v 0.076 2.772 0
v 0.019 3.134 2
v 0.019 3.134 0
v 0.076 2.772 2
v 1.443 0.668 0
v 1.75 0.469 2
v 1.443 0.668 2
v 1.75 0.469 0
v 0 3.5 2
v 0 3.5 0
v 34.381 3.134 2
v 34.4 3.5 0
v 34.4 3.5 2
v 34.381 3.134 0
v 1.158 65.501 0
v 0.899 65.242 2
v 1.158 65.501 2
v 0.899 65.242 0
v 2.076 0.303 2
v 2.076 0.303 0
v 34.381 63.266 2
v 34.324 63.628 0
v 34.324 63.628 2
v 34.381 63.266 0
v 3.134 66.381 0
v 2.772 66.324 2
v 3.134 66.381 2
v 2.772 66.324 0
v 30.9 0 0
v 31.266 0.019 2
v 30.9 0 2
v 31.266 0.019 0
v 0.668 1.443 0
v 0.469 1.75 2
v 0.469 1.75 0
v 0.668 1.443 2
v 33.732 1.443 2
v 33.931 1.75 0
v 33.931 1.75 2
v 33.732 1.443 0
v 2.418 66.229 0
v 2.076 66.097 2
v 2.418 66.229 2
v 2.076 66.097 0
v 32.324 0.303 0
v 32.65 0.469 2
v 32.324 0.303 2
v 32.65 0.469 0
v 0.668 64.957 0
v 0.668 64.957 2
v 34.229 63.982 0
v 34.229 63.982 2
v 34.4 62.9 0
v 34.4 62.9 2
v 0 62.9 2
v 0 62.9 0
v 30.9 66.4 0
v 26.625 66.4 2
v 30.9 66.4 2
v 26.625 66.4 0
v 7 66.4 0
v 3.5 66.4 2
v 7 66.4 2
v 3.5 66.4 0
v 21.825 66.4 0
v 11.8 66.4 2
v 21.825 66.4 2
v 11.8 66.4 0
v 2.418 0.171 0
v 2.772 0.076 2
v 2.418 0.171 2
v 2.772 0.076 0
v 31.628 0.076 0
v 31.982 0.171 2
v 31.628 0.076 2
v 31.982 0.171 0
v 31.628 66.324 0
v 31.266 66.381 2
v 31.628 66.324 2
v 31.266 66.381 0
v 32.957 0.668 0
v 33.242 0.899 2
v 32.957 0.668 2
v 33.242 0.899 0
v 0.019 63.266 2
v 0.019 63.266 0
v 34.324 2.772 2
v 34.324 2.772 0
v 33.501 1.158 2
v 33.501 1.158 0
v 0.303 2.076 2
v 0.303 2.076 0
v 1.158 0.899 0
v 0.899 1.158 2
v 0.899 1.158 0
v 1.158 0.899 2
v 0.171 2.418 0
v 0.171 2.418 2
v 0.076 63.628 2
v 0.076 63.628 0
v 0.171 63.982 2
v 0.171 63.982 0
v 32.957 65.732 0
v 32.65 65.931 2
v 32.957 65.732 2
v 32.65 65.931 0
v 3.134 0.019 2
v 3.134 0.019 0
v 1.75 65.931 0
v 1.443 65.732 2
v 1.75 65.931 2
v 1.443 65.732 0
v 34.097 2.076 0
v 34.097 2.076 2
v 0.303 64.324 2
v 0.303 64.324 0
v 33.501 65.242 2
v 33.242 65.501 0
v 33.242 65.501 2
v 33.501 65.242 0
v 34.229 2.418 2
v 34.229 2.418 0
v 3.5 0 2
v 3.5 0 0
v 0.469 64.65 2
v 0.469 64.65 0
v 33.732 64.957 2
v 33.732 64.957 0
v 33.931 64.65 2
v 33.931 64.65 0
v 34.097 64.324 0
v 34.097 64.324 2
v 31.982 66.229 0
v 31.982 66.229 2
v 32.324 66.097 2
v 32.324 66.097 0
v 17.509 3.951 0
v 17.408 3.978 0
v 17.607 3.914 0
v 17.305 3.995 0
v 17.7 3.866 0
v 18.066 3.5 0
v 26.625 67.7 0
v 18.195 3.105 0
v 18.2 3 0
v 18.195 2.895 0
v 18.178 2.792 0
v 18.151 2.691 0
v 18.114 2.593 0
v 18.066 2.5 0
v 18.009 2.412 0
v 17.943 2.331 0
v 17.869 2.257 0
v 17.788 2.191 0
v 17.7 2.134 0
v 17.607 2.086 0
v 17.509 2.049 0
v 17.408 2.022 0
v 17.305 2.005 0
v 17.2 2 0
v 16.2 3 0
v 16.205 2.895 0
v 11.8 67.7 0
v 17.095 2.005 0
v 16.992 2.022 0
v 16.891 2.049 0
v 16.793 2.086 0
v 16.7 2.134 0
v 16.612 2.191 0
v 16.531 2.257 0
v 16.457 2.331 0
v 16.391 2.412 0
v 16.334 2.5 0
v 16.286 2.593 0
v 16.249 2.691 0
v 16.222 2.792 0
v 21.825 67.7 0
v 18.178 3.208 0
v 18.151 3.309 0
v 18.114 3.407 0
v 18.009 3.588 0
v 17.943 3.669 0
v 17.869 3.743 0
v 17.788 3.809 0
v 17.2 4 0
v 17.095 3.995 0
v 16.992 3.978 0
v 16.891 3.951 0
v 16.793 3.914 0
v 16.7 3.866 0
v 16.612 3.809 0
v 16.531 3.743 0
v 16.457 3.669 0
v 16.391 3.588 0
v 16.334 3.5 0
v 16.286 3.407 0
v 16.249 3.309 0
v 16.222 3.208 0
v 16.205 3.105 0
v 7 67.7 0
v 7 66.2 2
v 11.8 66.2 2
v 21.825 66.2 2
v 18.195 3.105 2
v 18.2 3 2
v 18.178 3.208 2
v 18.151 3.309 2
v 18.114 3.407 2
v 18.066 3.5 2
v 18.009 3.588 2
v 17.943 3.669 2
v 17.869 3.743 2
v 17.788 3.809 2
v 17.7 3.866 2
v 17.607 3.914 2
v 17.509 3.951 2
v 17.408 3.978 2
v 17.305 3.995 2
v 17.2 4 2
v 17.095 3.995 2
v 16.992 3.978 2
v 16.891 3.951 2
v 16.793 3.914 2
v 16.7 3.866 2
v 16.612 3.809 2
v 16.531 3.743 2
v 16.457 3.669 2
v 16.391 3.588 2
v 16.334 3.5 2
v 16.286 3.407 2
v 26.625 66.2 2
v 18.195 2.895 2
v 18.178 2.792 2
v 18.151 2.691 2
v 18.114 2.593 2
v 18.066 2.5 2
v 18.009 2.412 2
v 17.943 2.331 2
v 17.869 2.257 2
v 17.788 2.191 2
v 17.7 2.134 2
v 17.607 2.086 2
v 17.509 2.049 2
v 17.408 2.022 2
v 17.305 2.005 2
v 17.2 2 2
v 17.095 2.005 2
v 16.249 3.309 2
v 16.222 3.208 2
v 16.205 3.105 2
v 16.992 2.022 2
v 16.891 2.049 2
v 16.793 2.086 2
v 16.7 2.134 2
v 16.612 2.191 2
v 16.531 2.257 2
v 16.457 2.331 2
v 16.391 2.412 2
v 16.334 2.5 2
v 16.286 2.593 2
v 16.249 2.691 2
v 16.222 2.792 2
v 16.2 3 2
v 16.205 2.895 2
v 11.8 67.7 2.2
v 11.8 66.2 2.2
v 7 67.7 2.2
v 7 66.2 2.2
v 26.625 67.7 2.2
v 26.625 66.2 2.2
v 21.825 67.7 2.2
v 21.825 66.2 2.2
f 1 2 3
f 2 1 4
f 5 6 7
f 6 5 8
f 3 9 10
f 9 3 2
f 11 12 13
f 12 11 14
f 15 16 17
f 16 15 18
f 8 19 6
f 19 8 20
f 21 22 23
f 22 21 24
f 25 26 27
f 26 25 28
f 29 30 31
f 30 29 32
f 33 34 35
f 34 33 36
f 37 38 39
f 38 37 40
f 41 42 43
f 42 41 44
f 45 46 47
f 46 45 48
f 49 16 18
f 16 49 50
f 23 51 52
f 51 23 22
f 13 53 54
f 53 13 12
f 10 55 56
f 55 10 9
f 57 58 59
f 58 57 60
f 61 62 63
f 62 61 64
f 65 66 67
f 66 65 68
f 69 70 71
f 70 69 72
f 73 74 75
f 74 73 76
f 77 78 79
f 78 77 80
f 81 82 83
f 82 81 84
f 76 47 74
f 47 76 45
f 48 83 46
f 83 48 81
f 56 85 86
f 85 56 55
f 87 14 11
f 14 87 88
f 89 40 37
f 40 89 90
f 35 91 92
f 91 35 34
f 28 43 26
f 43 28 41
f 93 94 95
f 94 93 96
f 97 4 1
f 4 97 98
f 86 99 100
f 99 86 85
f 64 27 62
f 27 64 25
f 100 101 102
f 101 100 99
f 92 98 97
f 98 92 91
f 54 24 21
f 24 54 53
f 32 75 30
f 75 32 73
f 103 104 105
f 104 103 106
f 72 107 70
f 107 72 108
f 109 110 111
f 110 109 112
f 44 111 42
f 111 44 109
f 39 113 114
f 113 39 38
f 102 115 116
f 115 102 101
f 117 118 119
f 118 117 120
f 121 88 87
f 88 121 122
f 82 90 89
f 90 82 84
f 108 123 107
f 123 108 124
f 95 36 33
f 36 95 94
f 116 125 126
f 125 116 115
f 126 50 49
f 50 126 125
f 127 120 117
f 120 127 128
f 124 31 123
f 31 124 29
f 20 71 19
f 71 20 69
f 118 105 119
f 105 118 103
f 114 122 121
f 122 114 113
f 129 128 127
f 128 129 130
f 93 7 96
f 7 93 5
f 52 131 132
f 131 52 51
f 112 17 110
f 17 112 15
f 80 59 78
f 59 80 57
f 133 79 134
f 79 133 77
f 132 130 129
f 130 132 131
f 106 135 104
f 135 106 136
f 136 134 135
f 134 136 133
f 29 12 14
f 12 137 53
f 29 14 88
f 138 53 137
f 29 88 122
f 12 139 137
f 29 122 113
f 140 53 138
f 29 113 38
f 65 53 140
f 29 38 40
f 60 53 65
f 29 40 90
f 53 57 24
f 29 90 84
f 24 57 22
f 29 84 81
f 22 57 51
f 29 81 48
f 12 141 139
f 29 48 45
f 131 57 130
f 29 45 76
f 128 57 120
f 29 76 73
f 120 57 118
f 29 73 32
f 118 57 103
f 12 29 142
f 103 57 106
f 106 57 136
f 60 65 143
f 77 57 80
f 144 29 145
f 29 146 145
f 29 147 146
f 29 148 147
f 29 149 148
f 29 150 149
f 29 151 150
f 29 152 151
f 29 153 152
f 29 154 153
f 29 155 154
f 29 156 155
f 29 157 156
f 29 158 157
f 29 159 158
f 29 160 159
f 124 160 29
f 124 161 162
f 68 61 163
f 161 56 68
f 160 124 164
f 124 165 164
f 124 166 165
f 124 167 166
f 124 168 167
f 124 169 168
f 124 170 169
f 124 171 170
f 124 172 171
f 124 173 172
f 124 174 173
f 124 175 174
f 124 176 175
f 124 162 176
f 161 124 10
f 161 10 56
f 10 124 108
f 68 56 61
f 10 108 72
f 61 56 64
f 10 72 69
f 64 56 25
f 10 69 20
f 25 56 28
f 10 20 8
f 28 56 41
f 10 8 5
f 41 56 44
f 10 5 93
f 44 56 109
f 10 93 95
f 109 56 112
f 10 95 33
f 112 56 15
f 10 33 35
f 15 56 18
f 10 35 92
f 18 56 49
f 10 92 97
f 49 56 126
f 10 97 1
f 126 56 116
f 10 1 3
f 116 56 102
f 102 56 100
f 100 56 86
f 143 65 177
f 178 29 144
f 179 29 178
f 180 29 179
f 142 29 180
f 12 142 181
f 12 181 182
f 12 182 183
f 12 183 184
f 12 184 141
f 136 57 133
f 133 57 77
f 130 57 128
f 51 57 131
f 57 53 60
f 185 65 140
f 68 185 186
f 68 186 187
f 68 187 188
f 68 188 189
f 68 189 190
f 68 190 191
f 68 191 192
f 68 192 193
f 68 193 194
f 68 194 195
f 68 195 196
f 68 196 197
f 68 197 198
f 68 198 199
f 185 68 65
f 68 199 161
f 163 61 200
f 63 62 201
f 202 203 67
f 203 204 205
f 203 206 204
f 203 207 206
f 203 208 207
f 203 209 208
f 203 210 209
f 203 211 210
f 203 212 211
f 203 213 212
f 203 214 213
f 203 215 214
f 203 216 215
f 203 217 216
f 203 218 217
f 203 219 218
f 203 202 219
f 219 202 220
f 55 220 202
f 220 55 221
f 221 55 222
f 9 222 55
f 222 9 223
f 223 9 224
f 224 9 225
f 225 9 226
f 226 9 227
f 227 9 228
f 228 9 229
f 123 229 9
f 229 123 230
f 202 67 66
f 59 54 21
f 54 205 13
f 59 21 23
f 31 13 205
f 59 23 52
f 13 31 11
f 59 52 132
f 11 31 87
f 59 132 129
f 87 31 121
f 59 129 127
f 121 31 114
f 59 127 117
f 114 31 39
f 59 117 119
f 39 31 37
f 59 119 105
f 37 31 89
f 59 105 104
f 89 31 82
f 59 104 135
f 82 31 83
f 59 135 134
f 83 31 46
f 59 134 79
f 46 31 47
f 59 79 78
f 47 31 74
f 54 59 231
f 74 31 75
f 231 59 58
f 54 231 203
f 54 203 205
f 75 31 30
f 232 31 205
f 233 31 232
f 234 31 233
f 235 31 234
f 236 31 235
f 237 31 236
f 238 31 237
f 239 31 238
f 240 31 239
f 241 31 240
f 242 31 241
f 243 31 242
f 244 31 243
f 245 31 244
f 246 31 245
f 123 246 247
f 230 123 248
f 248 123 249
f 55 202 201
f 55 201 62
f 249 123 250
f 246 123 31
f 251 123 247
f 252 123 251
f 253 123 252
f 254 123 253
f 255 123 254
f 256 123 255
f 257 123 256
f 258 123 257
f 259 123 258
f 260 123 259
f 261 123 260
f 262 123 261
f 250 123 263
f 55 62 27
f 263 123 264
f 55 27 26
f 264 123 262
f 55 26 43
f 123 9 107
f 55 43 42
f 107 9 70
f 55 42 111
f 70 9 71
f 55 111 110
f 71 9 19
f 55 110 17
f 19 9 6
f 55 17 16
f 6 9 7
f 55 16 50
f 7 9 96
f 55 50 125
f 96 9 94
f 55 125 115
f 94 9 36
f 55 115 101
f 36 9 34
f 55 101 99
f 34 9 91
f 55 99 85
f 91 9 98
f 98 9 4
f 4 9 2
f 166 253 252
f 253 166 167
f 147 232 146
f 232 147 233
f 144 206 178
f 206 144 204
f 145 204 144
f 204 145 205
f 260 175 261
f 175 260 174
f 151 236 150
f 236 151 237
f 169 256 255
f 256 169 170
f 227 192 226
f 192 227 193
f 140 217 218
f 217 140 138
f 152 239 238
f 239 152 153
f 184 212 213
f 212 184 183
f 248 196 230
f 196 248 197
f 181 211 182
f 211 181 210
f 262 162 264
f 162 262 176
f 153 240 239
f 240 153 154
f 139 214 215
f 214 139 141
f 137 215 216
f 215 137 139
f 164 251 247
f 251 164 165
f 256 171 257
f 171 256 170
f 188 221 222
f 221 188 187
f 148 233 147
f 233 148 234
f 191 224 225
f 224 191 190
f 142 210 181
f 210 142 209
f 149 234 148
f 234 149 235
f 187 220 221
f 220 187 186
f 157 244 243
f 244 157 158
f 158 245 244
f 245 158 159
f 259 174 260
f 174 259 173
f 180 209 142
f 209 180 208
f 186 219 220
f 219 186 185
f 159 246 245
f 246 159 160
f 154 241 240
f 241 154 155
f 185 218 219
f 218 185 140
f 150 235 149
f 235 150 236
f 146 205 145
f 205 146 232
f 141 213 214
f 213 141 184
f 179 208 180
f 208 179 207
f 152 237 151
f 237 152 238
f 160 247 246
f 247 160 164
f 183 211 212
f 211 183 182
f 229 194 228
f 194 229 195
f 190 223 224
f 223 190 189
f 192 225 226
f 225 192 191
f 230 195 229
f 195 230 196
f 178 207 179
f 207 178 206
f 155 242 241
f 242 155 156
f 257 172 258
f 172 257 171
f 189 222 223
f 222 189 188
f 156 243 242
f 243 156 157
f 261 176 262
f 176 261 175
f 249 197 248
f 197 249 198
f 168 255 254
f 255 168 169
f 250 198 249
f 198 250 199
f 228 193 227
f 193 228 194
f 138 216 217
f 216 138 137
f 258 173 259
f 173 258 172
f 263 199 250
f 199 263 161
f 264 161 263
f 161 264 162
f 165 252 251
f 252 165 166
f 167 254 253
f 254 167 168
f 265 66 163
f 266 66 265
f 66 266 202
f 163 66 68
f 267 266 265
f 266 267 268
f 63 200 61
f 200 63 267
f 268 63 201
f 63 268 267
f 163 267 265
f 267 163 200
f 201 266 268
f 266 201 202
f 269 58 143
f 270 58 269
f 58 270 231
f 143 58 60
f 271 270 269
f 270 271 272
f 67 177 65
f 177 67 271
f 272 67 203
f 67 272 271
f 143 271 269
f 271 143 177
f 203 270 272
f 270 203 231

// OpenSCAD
// =============================================================================
// Project: Parkside Battery Cover
// Target Printer: Bambu Lab A1 Mini (Max build volume: 180 x 180 x 180 mm)
// =============================================================================

// Battery Door Cover: 34mm (X) x 64mm (Y) x 4mm total recess
$fn = 60;

// Base Plate Dimensions (with -0.3mm print tolerance)
length = 34.4;   // Short axis (X)
width  = 66.4;   // Long axis (Y)
thickness = 2.0; // Base plate thickness
corner_r  = 3.5; // Corner fillet radius

// Screw Hole Specifications
hole_dia = 2.0;               // 2mm screw diameter
hole_x   = length / 2;        // 16.85mm (centered on 33.7mm plate)
hole_y   = 3.0;               // 3mm from the bottom edge

difference() {
    // --- 1. Main Base Plate ---
    linear_extrude(height = thickness) {
        hull() {
            translate([corner_r, corner_r]) circle(r = corner_r);
            translate([length - corner_r, corner_r]) circle(r = corner_r);
            translate([length - corner_r, width - corner_r]) circle(r = corner_r);
            translate([corner_r, width - corner_r]) circle(r = corner_r);
        }
    }

    // --- 2. Bottom Screw Hole ---
    translate([hole_x, hole_y, -1])
        cylinder(h = thickness + 2, d = hole_dia);
}

// --- 3. Top Retaining Tabs ---
tab_w   = 4.8; // Adjusted tab width (X)
tab_h   = 2.2;   // Tab height (Z)
tab_ext = 1.5;   // Extension length (Y)

// First Tab: starts at X = 7.0mm, ends at X = 12.075mm
translate([7.0, width - 0.2, 0])
    cube([tab_w, tab_ext, tab_h]);

// Second Tab: starts at X = 21.825mm (12.075 + 9.75 gap), ends at X = 26.9mm (leaves 7.5mm to right edge)
translate([21.825, width - 0.2, 0])
    cube([tab_w, tab_ext, tab_h]);
